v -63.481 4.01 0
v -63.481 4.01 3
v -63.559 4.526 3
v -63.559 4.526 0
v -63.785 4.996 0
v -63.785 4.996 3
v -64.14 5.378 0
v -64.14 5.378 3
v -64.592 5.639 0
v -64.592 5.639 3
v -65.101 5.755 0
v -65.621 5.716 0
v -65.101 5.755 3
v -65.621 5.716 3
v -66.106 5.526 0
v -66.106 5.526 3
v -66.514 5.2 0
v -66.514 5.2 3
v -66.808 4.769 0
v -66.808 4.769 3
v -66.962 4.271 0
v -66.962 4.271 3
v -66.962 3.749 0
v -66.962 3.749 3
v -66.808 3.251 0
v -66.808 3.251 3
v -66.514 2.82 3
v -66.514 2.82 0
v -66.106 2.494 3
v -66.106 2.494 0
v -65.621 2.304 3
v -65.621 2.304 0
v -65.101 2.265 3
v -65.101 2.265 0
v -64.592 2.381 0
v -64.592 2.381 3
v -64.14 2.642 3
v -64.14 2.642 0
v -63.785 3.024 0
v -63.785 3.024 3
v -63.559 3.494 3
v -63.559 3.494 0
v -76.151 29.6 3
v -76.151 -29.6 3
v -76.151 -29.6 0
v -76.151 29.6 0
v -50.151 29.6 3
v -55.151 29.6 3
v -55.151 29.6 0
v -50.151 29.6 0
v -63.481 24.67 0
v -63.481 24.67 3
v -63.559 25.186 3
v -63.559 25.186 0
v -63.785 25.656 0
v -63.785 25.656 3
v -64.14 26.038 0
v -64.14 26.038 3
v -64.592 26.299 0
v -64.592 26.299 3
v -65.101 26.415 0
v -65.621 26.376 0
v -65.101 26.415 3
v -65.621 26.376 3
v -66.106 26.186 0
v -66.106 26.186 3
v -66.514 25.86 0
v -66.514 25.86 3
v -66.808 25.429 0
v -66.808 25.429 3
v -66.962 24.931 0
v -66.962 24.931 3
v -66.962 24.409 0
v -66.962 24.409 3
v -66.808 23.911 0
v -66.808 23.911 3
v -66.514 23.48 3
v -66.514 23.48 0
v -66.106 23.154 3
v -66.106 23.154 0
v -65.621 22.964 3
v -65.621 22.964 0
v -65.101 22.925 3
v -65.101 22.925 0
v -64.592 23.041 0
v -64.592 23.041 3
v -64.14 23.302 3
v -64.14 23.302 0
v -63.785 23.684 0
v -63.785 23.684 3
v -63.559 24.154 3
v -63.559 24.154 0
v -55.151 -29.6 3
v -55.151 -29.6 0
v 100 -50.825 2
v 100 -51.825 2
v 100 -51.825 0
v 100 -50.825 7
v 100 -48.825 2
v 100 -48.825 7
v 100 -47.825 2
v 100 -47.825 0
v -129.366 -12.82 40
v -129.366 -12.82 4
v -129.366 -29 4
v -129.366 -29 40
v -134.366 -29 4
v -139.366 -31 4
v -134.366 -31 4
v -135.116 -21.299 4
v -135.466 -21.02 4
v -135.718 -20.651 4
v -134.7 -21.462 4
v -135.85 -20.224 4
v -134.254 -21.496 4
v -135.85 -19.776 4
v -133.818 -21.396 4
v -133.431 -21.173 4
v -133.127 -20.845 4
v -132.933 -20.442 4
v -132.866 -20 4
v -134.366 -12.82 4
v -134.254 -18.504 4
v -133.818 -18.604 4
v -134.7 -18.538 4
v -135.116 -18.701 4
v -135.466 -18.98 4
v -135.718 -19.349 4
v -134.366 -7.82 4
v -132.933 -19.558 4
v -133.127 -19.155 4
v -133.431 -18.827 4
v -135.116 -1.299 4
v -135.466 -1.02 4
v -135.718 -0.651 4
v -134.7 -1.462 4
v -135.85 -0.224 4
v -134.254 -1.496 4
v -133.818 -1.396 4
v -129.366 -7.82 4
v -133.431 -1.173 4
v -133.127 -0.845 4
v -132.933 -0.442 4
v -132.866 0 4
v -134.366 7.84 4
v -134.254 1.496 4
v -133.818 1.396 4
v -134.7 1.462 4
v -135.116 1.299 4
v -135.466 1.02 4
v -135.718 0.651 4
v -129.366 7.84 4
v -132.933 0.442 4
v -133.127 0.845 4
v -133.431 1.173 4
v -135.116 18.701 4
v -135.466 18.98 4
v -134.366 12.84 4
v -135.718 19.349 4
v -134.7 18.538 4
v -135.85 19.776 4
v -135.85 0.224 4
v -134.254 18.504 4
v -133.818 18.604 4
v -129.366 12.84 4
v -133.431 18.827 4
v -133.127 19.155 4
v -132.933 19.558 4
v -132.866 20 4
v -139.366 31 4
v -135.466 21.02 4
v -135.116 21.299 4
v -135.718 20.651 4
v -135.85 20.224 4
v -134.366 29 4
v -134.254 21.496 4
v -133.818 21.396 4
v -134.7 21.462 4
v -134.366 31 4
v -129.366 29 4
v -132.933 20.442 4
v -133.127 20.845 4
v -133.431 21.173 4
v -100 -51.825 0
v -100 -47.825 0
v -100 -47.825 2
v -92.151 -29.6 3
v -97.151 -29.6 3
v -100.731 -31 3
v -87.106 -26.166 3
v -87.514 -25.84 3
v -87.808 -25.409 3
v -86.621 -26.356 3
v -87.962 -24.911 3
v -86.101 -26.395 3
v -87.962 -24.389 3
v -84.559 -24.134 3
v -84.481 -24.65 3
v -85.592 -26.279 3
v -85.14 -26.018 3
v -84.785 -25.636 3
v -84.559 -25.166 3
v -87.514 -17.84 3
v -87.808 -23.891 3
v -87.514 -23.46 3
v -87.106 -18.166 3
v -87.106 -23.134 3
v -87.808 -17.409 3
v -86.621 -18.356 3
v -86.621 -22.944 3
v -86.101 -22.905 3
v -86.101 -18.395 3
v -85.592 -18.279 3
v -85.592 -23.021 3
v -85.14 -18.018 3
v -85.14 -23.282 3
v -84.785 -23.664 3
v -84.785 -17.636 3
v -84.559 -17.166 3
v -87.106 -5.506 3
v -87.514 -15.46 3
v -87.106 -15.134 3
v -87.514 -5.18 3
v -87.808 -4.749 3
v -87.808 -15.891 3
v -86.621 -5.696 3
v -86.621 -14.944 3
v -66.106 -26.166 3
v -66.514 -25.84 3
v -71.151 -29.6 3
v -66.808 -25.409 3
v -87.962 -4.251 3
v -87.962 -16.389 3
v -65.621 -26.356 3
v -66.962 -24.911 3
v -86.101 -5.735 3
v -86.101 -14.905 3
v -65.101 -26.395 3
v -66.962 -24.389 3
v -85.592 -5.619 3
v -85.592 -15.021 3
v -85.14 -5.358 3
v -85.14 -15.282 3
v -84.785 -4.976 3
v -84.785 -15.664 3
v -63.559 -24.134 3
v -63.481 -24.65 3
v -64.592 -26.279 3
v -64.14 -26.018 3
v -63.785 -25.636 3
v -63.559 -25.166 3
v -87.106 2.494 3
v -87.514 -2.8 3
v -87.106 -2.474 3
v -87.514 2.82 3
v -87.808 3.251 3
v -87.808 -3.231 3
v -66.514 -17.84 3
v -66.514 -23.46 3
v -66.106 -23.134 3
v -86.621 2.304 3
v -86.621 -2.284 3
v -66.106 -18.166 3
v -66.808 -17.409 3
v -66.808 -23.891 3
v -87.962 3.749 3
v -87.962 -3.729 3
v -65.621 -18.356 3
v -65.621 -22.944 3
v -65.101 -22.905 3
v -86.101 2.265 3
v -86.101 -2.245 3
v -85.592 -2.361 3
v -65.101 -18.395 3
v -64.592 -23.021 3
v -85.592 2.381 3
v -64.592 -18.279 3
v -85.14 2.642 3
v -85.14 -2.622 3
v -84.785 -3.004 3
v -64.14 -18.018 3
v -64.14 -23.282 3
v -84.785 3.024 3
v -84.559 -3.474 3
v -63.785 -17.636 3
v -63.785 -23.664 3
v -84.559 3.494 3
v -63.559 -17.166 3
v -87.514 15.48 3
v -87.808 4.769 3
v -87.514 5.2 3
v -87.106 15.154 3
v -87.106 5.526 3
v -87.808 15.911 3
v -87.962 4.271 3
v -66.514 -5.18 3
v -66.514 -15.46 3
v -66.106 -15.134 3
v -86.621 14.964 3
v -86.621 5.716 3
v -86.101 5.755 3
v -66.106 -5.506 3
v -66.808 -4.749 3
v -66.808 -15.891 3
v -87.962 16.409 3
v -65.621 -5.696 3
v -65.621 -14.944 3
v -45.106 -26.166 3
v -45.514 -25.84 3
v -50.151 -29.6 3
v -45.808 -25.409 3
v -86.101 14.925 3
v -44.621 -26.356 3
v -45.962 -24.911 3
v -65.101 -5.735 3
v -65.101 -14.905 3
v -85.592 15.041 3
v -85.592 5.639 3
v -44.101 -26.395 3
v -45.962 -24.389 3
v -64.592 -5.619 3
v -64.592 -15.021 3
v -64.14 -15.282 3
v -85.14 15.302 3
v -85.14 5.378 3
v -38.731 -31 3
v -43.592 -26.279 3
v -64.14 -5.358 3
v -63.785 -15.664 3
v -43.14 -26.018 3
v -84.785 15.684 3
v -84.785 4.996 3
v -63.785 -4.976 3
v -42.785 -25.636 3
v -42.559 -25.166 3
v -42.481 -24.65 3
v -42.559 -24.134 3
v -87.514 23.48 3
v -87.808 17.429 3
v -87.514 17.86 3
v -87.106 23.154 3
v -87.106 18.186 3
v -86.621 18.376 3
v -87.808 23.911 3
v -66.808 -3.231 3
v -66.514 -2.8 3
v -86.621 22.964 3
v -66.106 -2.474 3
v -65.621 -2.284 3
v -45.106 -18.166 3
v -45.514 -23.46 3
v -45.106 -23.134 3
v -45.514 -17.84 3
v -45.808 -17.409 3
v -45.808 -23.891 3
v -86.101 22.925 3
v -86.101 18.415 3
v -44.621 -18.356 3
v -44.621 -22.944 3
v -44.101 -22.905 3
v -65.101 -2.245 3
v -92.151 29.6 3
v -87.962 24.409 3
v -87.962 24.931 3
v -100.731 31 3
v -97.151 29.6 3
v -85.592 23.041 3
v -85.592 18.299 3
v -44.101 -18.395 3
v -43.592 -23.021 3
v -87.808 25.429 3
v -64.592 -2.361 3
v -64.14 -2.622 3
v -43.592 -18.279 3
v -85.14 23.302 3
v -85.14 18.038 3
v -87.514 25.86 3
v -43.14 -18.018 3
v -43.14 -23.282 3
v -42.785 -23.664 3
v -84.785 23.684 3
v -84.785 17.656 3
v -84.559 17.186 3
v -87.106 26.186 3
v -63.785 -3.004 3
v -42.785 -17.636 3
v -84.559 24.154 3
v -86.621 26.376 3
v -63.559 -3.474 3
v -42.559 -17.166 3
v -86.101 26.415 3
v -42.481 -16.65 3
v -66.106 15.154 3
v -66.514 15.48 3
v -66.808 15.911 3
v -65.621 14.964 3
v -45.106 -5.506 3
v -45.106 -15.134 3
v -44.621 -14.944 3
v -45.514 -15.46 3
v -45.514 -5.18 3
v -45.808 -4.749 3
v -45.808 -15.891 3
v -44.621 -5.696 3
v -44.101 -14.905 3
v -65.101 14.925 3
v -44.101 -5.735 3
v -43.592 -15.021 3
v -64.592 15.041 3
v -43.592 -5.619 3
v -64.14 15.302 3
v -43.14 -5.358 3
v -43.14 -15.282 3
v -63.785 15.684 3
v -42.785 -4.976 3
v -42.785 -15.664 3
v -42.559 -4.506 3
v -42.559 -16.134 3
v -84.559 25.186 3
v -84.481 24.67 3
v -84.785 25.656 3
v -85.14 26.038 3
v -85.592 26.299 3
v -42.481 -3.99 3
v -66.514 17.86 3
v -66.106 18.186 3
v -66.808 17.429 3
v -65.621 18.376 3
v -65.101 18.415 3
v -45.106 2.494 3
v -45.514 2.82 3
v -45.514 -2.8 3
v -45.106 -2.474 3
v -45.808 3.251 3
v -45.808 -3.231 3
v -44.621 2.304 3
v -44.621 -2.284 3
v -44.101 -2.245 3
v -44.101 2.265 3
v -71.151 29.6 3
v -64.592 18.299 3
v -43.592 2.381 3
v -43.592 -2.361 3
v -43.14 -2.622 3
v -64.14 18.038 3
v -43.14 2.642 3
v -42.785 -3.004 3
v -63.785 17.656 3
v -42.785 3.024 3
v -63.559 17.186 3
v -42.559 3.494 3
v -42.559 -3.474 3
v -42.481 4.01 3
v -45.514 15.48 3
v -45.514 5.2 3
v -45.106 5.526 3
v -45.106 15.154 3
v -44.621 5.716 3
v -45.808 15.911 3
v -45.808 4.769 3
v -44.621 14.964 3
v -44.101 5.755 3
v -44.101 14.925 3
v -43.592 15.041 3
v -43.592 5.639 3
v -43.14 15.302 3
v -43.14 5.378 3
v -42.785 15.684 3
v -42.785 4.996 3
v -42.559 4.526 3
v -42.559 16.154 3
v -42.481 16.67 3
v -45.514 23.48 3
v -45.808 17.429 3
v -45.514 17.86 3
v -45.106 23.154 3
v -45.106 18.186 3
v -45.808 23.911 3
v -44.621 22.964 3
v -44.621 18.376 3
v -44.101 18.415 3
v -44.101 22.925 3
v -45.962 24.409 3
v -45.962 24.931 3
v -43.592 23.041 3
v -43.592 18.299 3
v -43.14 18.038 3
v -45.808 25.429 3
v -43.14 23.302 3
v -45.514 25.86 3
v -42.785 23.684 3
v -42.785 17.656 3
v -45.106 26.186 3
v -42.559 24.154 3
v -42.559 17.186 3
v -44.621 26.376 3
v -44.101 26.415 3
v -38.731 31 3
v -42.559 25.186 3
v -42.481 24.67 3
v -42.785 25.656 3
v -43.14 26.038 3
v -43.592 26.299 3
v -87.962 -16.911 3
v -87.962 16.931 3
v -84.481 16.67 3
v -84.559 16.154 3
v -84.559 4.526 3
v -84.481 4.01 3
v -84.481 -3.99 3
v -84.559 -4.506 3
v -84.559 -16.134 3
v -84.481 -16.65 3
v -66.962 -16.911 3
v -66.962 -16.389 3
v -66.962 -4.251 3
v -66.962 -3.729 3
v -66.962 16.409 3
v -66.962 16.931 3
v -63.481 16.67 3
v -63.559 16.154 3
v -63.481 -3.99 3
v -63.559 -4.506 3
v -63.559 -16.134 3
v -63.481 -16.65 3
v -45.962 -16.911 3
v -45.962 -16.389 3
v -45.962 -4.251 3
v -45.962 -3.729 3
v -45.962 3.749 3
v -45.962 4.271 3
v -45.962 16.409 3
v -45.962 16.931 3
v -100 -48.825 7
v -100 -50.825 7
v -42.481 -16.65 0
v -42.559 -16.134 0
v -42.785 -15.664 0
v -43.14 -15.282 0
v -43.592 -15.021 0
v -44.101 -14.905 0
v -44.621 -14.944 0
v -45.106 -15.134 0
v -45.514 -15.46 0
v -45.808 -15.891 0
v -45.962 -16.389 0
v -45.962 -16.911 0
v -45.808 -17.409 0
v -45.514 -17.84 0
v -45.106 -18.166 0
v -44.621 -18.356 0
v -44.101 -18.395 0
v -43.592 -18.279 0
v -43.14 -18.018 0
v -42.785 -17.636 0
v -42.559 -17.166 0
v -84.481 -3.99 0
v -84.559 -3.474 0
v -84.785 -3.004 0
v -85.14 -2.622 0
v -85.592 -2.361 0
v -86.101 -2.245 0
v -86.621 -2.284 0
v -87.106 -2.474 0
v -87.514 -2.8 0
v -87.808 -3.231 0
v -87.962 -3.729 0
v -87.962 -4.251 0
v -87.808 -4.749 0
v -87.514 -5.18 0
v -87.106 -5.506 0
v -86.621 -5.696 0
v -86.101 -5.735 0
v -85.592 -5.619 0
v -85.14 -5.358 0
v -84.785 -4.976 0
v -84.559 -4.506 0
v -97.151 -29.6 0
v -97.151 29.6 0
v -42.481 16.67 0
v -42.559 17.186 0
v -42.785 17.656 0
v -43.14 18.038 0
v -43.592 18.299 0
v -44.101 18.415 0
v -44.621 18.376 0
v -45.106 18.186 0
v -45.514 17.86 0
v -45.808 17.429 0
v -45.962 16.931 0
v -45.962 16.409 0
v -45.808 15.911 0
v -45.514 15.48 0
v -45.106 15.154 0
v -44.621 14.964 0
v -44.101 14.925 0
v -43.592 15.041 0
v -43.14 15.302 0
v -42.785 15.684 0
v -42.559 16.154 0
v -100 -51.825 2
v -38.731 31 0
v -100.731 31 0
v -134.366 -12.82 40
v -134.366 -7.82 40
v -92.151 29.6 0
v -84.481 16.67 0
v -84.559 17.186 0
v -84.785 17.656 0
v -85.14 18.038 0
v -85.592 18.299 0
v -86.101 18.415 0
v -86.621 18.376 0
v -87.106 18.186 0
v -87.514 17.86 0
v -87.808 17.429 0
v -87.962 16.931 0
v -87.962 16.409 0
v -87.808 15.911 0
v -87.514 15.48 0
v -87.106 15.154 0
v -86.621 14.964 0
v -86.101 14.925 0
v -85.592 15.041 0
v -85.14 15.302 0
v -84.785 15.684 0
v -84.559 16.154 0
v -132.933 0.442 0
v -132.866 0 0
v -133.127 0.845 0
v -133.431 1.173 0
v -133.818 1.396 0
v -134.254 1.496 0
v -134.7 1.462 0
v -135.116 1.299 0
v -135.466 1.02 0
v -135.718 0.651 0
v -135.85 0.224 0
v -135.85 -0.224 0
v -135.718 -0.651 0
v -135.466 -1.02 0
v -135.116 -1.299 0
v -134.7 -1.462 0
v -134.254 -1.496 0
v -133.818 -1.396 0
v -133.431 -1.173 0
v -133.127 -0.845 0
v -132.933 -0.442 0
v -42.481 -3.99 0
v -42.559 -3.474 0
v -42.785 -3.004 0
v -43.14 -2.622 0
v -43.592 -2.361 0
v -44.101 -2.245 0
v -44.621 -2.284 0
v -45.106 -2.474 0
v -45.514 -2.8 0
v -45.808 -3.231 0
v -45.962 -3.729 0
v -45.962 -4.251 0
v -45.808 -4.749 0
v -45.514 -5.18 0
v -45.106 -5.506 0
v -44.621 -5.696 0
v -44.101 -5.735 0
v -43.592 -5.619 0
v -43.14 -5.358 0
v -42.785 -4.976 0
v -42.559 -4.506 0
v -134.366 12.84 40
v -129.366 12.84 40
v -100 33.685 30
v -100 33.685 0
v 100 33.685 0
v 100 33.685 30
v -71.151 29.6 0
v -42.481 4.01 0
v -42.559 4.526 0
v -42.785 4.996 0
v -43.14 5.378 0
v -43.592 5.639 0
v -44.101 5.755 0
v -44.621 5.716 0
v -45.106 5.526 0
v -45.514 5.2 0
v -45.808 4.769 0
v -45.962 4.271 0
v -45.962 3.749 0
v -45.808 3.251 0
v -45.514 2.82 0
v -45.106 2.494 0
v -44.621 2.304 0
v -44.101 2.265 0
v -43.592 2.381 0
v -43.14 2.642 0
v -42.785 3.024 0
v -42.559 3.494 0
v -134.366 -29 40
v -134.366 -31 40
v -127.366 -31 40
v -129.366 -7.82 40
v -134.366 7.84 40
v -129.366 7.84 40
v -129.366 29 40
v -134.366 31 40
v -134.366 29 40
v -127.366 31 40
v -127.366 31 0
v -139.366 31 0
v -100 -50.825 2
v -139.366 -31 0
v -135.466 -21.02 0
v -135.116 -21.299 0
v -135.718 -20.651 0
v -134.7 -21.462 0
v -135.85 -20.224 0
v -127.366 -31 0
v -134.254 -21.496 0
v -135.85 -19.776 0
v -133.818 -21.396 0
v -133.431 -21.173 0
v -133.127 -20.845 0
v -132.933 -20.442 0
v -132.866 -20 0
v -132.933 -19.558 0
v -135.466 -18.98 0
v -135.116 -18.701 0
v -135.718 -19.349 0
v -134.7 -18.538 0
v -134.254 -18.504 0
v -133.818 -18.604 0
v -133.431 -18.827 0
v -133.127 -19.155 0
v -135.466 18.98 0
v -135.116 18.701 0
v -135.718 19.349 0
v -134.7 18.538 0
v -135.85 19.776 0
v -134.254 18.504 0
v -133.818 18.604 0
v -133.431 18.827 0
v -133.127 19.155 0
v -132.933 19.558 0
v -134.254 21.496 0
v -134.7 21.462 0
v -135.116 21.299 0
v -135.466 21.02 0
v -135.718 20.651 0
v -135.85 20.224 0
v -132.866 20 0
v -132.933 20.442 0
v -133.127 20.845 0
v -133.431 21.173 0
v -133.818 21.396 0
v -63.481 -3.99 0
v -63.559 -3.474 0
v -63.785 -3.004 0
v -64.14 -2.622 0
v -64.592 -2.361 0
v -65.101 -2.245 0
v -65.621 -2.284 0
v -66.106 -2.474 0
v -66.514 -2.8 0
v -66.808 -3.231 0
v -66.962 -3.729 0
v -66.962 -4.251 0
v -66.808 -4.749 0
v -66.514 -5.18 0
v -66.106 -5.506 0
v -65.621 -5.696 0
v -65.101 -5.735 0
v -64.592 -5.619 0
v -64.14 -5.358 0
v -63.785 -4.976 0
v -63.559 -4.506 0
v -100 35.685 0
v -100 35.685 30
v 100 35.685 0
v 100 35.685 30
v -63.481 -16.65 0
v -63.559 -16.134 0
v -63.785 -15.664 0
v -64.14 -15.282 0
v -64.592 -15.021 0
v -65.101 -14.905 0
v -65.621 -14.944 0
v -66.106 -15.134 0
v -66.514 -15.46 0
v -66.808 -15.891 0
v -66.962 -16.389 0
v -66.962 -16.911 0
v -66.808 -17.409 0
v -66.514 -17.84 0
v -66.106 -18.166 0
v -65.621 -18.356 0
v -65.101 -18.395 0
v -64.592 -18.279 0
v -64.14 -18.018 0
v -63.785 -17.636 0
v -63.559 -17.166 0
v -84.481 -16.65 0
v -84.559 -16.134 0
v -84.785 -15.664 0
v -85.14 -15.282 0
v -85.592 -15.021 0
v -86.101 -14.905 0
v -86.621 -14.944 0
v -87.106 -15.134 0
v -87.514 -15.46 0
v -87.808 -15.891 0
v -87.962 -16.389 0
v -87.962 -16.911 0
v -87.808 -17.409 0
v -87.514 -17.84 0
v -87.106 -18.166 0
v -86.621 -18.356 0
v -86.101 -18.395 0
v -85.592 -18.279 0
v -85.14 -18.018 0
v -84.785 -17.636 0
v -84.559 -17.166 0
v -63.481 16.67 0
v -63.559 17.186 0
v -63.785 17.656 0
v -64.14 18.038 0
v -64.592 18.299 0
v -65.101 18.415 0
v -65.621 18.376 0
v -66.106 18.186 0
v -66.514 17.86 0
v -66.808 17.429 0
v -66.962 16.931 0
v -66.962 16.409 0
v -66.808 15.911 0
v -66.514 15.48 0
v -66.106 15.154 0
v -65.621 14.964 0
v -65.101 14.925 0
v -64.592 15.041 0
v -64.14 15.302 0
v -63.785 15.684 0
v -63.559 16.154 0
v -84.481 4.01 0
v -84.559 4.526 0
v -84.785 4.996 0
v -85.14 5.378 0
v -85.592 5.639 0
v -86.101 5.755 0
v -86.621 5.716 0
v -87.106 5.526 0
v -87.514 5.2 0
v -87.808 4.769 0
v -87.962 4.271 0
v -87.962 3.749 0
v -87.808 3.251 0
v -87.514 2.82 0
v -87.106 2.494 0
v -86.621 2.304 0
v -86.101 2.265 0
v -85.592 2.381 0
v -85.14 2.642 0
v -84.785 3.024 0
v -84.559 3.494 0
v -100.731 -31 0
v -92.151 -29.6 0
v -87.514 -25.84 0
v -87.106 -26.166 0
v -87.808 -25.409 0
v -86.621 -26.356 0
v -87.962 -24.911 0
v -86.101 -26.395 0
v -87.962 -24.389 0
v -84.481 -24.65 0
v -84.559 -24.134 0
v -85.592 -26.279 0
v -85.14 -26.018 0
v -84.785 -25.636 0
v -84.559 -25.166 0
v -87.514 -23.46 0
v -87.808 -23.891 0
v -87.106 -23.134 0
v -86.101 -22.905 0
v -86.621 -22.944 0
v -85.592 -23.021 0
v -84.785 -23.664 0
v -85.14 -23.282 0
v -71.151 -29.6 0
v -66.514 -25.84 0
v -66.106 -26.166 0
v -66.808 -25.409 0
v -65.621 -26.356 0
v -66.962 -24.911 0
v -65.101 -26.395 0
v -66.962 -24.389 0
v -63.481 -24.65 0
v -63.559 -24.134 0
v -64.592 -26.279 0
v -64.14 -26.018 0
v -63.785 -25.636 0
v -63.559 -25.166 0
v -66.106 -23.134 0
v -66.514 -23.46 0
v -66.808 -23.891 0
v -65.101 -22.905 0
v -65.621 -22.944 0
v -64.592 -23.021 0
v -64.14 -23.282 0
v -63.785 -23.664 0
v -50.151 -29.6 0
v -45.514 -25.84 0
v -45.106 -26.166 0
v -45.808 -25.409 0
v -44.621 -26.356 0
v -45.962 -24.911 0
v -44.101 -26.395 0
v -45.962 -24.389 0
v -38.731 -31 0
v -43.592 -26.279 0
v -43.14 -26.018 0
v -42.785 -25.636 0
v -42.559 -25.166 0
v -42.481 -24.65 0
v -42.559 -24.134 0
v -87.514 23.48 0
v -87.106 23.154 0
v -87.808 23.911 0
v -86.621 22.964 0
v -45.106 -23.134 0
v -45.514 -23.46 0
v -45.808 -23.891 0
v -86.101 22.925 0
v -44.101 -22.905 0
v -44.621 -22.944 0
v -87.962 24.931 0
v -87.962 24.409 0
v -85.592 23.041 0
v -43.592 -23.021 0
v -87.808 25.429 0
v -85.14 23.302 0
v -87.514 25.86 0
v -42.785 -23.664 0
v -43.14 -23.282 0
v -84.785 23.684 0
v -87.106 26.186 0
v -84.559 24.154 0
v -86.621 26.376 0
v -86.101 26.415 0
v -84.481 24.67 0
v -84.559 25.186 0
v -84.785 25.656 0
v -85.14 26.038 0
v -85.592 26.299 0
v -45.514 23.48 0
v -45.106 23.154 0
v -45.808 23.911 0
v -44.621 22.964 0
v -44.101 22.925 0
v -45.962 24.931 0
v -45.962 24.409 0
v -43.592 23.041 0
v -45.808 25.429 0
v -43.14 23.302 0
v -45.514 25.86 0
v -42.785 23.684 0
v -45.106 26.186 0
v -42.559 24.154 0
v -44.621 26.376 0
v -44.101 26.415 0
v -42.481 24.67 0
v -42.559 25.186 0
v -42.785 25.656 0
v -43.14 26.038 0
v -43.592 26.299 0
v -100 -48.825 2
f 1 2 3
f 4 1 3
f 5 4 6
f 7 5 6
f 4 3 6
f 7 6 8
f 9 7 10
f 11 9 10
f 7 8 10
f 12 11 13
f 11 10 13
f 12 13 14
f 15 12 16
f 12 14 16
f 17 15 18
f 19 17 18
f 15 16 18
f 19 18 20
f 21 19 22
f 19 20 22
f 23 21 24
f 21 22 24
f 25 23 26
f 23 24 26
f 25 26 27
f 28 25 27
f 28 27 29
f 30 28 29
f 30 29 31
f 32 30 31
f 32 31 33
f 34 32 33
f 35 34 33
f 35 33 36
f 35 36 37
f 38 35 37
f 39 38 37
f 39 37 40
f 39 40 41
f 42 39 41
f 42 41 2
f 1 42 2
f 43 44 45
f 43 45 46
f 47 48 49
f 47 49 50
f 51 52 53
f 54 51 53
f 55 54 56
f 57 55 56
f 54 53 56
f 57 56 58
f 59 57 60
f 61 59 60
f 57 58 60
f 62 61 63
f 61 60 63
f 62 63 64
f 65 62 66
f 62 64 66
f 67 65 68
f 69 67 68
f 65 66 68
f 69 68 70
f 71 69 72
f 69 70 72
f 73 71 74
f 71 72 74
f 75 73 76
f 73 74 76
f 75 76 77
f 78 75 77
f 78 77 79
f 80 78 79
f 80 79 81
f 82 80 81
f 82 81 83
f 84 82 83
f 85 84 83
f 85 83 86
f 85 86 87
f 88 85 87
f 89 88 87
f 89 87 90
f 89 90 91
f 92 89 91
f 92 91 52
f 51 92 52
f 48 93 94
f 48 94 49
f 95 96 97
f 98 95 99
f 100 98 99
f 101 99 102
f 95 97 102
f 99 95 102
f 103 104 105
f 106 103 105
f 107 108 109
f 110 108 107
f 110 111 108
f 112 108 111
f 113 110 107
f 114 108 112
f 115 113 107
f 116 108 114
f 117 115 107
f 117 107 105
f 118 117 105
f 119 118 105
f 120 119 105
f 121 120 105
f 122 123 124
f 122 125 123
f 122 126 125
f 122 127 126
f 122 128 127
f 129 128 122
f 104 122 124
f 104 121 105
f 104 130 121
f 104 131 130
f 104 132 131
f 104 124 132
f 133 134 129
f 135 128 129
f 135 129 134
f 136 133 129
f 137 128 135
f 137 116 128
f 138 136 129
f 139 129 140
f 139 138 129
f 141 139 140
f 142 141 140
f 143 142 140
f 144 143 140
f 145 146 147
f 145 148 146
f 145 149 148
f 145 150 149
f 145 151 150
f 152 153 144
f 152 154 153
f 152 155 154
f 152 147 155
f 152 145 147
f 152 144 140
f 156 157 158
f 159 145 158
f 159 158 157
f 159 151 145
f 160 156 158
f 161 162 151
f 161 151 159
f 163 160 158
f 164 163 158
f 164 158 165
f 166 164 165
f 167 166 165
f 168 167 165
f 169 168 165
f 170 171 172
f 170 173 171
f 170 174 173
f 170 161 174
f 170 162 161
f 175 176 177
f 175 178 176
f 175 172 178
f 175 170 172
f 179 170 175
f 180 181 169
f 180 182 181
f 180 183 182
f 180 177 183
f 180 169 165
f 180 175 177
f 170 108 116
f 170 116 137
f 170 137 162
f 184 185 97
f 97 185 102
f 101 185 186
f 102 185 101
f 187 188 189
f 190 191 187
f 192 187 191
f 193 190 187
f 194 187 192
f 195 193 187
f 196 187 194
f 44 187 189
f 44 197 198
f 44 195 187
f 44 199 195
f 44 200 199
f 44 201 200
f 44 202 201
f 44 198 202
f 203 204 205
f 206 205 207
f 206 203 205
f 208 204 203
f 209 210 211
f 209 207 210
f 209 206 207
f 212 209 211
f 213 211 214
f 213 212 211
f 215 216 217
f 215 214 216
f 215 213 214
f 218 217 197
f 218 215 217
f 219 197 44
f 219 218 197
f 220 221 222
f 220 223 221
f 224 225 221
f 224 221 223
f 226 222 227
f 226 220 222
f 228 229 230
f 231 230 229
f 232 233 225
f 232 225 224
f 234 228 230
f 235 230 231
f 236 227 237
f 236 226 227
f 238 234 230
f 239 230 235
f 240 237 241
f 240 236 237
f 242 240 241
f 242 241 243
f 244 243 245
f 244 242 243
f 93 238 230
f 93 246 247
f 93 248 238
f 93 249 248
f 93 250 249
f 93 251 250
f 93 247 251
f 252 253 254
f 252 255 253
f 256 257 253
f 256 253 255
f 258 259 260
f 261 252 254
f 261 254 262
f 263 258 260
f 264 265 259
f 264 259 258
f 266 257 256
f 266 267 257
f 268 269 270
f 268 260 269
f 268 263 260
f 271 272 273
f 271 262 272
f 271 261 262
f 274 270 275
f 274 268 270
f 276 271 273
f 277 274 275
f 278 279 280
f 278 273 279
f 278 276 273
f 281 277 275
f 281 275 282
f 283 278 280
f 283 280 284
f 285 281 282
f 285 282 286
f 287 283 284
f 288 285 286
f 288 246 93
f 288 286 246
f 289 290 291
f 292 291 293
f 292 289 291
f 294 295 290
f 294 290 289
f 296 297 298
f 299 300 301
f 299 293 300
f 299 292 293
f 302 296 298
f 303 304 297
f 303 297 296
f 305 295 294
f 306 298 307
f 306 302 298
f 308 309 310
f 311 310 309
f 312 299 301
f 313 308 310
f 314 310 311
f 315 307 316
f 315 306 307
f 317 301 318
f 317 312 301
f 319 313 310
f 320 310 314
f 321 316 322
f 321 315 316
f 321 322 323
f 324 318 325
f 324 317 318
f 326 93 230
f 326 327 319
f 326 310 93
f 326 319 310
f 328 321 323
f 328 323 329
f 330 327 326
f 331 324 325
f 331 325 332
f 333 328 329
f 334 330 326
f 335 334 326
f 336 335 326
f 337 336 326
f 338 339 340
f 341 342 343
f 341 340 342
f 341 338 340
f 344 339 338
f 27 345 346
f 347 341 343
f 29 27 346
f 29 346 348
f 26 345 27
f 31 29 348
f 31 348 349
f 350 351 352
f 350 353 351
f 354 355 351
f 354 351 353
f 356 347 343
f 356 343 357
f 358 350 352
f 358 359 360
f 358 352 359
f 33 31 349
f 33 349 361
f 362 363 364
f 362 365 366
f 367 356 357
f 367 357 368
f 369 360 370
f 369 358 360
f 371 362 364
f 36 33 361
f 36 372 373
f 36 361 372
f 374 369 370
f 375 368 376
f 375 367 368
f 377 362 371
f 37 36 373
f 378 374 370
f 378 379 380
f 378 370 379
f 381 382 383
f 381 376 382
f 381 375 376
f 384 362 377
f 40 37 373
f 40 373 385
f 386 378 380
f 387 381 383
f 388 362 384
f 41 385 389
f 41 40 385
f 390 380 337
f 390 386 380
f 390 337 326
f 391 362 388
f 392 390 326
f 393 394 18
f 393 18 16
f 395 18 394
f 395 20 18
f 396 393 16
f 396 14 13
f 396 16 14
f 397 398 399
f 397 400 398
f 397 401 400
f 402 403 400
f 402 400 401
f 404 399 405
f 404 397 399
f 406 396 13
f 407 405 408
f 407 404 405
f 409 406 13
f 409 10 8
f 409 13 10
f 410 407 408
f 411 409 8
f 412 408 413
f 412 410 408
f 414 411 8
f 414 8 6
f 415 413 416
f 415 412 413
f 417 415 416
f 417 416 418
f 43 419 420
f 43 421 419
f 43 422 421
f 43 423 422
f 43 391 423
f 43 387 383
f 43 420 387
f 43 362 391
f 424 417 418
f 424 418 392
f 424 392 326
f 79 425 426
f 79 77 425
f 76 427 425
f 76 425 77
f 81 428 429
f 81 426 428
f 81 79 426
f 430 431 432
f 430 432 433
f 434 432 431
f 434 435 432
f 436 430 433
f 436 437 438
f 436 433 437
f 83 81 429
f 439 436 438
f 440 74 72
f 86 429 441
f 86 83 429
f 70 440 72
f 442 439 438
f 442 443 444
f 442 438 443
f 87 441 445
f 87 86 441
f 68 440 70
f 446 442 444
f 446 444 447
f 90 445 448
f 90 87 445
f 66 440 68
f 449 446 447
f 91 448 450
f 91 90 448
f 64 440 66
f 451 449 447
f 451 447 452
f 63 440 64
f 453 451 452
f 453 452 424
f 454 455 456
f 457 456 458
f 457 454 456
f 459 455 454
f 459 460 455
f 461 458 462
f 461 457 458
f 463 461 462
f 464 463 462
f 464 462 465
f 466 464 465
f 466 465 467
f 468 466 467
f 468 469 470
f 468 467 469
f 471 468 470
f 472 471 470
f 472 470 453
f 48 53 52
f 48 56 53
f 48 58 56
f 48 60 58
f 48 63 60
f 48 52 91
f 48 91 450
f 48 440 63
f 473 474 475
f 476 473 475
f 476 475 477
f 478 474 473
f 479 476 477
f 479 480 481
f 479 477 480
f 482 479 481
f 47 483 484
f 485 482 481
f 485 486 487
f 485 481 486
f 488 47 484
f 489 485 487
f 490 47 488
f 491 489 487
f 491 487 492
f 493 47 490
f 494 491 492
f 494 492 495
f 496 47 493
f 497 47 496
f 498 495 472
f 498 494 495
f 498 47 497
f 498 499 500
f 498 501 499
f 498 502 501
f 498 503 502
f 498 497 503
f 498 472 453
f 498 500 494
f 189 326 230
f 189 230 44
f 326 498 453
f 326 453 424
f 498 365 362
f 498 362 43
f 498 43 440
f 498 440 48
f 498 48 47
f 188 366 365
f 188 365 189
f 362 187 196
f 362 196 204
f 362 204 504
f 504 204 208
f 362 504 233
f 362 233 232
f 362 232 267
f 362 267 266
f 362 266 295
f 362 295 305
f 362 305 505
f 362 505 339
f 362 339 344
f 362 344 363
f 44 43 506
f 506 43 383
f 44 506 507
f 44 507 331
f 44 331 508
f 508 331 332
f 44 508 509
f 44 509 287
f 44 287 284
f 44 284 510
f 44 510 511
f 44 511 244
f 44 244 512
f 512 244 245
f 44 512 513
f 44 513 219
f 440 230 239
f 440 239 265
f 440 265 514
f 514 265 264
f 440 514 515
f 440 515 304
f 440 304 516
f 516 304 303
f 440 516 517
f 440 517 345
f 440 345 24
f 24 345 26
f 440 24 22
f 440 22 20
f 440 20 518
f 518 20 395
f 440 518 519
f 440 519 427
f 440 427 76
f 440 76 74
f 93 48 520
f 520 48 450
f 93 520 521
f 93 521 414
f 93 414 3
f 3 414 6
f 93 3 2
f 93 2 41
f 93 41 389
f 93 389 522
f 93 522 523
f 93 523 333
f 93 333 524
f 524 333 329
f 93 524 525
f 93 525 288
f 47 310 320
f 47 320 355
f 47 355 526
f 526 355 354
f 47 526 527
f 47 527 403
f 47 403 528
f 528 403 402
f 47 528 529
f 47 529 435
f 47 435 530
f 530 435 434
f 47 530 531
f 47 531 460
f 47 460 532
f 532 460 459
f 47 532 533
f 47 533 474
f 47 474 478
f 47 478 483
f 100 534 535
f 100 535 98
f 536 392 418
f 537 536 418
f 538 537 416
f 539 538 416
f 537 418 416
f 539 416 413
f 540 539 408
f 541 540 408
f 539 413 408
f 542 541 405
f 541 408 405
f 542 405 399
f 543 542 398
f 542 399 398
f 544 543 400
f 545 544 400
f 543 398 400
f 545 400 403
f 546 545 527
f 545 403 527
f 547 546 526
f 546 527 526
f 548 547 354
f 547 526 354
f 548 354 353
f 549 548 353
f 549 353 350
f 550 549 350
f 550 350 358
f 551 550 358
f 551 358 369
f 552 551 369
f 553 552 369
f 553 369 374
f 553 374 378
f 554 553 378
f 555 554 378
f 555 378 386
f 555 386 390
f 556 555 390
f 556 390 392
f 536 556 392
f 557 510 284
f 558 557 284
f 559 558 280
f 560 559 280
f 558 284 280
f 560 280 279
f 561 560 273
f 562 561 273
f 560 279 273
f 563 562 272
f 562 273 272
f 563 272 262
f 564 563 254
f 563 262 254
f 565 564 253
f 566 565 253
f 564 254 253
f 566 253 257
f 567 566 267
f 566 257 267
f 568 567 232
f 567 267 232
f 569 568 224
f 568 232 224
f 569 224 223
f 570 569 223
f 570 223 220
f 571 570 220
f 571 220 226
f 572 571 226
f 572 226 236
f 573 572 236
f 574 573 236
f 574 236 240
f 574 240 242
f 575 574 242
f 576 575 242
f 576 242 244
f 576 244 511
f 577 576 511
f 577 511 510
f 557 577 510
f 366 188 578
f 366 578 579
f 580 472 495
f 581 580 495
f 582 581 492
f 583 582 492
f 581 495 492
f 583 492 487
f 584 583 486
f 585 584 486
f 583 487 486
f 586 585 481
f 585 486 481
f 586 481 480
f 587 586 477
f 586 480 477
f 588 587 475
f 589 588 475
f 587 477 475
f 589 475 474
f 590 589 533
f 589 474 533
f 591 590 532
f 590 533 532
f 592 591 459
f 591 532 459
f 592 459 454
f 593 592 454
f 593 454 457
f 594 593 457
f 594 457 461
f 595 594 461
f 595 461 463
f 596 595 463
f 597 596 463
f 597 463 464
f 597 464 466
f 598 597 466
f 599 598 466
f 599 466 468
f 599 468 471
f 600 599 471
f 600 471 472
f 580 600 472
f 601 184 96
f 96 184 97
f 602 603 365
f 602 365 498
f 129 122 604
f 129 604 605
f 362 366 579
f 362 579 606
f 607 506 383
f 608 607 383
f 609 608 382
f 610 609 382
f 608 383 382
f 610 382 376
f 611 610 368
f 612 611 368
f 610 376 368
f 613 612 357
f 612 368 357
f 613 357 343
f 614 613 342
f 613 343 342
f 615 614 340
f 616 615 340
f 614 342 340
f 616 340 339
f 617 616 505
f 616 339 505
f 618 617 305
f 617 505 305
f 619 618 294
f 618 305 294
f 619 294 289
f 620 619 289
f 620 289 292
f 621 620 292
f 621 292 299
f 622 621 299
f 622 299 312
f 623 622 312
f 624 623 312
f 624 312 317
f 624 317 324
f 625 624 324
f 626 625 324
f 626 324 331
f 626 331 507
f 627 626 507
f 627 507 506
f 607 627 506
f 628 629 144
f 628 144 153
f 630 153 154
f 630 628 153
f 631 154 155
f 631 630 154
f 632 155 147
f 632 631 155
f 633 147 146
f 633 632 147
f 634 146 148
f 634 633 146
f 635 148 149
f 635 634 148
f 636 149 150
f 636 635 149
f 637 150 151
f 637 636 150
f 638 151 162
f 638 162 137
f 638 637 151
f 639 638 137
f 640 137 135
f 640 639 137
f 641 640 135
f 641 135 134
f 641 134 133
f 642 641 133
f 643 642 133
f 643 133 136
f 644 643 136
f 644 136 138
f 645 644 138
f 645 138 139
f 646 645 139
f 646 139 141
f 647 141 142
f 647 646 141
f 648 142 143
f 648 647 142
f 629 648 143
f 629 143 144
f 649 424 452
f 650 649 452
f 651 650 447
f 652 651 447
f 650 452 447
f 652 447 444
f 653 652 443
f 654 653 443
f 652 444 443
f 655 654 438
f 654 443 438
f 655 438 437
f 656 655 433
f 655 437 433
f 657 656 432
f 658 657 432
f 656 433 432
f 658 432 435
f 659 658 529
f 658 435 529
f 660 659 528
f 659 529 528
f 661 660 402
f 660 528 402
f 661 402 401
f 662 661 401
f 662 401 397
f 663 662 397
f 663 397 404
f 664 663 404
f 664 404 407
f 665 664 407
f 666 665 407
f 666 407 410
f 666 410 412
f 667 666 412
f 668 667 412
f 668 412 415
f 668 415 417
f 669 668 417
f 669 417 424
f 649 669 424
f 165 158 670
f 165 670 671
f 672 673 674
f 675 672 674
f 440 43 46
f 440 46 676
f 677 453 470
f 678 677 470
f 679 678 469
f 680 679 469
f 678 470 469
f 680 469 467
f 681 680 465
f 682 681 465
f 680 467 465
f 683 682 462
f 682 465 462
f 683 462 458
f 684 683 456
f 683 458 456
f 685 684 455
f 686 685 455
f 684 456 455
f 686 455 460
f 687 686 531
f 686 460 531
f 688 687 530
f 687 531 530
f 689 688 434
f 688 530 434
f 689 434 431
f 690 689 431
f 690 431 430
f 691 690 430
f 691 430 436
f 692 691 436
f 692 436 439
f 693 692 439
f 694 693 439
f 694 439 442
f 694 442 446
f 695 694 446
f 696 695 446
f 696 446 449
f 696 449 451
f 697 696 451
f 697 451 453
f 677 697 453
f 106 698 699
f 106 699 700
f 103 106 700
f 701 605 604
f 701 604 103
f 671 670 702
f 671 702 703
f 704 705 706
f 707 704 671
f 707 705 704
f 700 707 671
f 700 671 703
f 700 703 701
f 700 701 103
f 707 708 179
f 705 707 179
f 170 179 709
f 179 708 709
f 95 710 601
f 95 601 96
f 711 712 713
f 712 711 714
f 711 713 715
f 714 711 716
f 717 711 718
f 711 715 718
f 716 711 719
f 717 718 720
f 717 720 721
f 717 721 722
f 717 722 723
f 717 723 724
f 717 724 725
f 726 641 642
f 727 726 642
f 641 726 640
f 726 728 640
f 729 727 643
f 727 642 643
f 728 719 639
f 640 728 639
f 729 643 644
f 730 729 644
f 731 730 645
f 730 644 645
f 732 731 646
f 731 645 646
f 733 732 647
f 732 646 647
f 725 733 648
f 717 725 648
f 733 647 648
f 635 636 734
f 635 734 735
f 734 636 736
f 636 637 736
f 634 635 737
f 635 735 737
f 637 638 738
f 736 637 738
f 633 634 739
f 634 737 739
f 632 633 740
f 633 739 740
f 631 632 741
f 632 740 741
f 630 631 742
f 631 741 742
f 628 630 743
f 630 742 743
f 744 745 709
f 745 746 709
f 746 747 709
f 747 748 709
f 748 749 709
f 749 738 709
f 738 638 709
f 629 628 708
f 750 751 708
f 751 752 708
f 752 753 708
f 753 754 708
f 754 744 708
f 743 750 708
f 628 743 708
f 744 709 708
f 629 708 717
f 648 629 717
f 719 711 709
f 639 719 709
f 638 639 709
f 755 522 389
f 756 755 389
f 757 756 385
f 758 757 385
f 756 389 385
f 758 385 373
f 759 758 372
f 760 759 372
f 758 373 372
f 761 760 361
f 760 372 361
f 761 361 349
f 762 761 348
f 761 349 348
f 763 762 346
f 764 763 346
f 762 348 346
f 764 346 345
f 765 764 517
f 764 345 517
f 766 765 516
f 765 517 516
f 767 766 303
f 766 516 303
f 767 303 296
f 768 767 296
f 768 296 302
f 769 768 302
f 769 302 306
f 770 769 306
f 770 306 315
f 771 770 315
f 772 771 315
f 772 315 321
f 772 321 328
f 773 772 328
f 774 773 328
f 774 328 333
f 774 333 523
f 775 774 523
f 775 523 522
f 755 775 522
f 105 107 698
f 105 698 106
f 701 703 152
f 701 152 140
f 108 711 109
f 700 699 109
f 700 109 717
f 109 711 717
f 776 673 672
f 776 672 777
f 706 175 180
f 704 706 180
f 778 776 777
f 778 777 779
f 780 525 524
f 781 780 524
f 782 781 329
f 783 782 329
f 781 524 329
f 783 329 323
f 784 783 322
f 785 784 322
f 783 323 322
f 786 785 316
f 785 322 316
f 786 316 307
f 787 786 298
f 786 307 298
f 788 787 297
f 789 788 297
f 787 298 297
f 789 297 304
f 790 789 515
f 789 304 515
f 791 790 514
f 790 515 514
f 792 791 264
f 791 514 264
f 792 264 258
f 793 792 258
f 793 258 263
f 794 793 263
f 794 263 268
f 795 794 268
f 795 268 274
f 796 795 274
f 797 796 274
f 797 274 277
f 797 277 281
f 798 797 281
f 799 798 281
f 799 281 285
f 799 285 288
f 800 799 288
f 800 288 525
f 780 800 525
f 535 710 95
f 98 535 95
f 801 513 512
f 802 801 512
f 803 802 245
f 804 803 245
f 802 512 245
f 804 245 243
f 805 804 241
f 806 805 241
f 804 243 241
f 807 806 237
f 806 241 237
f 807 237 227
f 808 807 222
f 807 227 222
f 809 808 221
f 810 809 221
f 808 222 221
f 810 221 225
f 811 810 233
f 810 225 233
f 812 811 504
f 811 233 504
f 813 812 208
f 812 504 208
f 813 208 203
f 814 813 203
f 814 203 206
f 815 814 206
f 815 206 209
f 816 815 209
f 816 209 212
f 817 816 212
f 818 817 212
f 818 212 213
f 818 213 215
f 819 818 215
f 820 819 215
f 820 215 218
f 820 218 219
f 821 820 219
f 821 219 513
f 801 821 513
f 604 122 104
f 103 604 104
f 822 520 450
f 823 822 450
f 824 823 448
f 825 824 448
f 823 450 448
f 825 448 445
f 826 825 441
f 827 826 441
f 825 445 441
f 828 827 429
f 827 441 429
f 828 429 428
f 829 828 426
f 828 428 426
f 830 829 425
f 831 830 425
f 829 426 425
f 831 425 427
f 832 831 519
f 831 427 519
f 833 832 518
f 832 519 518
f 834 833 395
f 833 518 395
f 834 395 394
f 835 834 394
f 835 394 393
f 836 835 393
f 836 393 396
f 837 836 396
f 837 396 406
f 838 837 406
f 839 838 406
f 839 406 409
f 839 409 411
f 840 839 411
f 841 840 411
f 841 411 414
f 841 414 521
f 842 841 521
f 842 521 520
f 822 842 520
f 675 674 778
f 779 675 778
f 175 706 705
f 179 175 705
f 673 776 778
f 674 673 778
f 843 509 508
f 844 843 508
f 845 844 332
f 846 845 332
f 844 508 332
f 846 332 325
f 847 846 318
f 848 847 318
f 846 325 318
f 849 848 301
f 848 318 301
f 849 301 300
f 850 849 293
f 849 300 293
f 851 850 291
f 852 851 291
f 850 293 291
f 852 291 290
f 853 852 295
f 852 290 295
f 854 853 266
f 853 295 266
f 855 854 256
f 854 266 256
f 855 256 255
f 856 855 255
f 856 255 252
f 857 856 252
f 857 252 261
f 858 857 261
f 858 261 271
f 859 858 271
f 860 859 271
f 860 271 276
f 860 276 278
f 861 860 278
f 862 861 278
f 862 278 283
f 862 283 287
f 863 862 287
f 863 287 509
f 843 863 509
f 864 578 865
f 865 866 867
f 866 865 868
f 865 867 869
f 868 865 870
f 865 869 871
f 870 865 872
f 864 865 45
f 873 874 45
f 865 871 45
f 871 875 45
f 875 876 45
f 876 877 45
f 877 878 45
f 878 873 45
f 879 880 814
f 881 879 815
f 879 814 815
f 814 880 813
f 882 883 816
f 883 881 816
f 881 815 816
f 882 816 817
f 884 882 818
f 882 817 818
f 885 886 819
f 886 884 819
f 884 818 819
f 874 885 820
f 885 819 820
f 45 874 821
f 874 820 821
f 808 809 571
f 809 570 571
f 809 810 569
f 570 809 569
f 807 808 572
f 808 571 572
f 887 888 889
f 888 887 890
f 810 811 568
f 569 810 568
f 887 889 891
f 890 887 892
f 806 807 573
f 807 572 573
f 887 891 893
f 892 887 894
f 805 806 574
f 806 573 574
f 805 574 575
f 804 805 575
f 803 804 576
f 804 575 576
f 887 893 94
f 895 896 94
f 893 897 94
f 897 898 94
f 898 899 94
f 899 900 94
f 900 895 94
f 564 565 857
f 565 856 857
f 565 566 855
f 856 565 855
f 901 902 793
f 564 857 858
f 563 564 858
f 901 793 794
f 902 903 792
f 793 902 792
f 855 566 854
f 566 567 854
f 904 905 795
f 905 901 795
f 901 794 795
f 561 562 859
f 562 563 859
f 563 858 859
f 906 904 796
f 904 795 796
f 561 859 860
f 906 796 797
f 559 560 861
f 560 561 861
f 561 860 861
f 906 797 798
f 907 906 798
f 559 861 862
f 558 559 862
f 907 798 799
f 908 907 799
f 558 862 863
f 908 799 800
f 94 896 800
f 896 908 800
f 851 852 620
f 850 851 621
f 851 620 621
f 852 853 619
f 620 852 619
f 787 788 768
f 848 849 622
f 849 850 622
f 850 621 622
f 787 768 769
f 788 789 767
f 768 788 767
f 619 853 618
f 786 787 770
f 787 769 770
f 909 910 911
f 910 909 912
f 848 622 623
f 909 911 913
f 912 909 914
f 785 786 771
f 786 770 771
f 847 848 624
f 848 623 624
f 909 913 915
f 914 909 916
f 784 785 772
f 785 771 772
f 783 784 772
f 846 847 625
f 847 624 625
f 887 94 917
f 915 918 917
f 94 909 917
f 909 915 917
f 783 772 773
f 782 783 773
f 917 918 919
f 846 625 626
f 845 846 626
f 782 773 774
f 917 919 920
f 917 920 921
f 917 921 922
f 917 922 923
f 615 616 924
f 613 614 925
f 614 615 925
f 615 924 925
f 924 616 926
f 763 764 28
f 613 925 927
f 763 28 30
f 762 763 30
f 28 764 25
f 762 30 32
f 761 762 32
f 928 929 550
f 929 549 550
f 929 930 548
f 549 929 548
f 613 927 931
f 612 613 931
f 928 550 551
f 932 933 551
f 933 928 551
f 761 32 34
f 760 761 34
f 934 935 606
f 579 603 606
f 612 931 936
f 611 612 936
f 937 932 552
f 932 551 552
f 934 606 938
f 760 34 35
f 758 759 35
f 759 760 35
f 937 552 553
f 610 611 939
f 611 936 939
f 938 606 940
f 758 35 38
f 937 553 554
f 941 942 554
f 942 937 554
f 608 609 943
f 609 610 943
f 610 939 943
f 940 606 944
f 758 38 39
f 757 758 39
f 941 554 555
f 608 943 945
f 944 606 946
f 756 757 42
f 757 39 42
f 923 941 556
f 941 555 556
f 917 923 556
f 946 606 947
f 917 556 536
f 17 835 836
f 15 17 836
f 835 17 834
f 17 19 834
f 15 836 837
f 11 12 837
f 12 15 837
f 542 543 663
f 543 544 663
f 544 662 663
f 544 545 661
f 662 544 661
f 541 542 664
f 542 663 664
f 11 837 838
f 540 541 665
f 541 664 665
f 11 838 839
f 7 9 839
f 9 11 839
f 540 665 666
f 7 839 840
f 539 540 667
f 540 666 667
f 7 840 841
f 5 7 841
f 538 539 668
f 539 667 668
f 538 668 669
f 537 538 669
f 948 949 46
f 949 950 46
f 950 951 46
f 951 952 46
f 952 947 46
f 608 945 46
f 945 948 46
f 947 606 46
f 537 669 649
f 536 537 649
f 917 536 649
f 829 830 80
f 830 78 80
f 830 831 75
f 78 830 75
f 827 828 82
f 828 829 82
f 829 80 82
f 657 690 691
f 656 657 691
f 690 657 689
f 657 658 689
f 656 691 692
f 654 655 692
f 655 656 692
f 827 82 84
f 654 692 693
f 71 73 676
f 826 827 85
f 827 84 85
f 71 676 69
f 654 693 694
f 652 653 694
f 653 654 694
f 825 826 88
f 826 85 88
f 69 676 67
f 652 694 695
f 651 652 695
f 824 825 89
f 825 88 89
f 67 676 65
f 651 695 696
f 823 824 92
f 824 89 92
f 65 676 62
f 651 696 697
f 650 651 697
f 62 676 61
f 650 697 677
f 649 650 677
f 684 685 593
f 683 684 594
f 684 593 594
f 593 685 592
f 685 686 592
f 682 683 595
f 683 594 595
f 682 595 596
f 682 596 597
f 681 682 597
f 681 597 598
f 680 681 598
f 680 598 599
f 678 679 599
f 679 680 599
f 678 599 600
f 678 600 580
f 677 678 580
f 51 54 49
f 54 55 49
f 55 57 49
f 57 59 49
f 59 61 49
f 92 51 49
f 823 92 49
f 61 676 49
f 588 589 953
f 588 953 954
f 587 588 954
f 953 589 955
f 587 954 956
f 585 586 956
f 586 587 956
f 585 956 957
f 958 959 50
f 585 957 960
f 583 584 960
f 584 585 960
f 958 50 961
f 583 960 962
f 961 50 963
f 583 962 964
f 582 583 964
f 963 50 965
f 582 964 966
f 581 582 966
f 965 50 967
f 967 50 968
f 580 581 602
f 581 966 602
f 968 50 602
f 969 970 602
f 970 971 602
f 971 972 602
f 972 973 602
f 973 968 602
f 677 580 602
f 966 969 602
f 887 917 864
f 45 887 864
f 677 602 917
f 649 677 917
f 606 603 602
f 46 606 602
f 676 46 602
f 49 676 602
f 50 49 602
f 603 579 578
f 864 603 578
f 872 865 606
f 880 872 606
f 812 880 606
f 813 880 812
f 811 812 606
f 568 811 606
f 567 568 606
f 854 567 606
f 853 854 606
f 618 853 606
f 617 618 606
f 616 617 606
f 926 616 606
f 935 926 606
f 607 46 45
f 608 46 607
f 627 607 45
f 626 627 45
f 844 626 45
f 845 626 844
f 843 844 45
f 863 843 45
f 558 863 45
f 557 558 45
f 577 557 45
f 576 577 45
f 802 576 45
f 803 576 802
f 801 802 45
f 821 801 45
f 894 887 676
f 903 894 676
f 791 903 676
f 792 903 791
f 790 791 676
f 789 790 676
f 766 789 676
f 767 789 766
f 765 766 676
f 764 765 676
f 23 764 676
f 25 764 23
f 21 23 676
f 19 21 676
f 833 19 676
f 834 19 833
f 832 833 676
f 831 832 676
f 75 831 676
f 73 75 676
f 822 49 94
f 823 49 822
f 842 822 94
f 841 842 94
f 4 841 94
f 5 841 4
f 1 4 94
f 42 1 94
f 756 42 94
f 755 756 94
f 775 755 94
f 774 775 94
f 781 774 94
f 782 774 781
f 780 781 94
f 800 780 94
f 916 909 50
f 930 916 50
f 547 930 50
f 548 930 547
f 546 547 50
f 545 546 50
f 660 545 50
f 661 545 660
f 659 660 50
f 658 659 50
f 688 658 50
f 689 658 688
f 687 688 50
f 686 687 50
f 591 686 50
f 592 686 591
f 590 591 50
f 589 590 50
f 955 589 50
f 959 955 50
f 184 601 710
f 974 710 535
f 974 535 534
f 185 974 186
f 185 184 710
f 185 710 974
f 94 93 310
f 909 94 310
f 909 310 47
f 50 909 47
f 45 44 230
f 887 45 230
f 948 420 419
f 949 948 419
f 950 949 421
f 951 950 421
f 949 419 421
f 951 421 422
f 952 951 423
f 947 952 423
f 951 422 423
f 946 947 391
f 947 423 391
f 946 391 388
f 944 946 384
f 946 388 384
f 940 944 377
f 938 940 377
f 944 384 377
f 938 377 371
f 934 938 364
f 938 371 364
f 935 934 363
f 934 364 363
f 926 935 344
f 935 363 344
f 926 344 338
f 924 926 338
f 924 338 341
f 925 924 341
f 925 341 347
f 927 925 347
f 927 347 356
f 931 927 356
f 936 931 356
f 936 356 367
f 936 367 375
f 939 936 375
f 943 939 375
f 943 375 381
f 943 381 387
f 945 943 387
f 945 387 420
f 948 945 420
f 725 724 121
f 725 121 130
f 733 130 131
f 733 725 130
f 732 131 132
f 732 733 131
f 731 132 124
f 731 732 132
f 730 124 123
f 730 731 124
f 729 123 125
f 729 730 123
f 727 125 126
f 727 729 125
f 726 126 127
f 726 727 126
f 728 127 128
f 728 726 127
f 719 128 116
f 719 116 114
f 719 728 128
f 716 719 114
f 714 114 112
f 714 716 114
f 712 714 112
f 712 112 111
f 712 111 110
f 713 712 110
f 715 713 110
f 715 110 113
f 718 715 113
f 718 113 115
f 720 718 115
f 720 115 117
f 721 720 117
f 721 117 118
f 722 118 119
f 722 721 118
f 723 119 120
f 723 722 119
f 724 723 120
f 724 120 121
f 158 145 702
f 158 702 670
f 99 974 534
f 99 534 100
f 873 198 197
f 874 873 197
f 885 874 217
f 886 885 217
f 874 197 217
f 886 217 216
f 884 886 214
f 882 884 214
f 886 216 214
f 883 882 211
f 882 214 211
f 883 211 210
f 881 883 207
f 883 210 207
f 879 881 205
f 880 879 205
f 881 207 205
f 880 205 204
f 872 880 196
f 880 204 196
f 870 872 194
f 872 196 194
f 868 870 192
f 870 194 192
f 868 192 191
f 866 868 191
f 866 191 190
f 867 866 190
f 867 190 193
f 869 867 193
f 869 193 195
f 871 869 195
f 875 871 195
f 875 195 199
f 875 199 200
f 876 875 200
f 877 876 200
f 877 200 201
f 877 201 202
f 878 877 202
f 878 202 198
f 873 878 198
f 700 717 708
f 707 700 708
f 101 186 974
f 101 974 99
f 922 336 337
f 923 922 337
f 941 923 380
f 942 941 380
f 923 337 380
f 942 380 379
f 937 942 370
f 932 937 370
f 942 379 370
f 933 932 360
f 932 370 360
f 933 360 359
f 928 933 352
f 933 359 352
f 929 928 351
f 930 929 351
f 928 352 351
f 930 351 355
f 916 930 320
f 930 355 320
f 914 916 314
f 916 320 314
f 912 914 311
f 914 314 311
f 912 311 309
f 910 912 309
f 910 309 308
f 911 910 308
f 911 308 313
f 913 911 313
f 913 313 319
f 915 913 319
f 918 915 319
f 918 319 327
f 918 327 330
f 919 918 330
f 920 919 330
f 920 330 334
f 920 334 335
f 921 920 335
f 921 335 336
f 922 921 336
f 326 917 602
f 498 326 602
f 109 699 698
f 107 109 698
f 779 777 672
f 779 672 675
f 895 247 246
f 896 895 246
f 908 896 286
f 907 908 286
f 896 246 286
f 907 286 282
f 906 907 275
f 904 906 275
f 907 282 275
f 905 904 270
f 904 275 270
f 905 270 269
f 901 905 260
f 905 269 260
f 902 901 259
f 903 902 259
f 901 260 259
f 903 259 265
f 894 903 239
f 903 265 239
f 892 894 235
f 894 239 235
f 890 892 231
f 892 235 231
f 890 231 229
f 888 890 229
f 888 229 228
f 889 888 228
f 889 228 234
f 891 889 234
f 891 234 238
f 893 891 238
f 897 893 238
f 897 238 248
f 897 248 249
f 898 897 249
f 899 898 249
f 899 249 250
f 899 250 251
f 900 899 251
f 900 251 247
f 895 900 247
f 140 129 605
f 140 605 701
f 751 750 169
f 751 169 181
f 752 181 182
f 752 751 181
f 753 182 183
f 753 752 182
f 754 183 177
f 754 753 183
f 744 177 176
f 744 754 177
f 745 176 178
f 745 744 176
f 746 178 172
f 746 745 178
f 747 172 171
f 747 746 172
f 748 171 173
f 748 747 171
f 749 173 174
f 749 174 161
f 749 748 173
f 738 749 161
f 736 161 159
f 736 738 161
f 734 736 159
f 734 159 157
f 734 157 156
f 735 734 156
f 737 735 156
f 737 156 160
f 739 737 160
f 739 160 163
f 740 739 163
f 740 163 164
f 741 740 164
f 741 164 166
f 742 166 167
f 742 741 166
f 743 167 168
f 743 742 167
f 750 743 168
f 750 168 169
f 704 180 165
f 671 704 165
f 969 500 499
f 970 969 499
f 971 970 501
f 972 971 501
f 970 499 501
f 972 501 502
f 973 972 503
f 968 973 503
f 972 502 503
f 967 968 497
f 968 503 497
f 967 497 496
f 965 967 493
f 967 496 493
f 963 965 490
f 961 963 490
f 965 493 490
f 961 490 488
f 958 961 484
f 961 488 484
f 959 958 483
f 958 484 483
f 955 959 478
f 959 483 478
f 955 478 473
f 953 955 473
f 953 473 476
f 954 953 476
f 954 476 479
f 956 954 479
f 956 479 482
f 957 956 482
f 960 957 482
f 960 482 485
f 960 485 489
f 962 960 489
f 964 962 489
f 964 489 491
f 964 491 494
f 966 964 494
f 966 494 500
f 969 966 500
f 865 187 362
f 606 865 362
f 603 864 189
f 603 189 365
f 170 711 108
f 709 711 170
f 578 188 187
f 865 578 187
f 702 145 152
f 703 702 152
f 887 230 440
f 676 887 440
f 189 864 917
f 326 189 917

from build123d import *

# Parameters (mm, degrees)
F0_W      = 62
F0_H      = 62
F1_DEPTH  = 3
F2_R      = 1.75
F2_W      = 5
F2_H      = 59.2
F3_DEPTH  = 25
F4_W      = 10
F4_H      = 62
F4_R      = 1.5
F5_DEPTH  = 4
F6_W      = 5
F6_H      = 2
F6_H_2    = 5
F7_DEPTH  = 40
F8_W      = 200
F8_H      = 2
F9_DEPTH  = 30
F10_W     = 200
F10_H     = 4
F11_DEPTH = 2
F12_W     = 200
F12_H     = 2
F13_DEPTH = 5


with BuildPart() as f1:
    # F0 (on Top) → F1 (new body)
    with BuildSketch(Plane.XY):
        with Locations((-69.7313, 0)):
            Rectangle(F0_W, F0_H)
    extrude(amount=F1_DEPTH)

    # F2 (on face) → F3 (cut)
    with BuildSketch(Plane.XY.offset(3)):
        with Locations((-86.2313, 24.67)):
            Circle(F2_R)
        with Locations((-86.2313, 16.67)):
            Circle(F2_R)
        with Locations((-86.2313, 4.01)):
            Circle(F2_R)
        with Locations((-86.2313, -3.99)):
            Circle(F2_R)
        with Locations((-86.2313, -16.65)):
            Circle(F2_R)
        with Locations((-86.2313, -24.65)):
            Circle(F2_R)
        with Locations((-65.2313, 24.67)):
            Circle(F2_R)
        with Locations((-65.2313, 16.67)):
            Circle(F2_R)
        with Locations((-65.2313, 4.01)):
            Circle(F2_R)
        with Locations((-65.2313, -3.99)):
            Circle(F2_R)
        with Locations((-65.2313, -16.65)):
            Circle(F2_R)
        with Locations((-65.2313, -24.65)):
            Circle(F2_R)
        with Locations((-44.2313, 24.67)):
            Circle(F2_R)
        with Locations((-44.2313, 16.67)):
            Circle(F2_R)
        with Locations((-44.2313, 4.01)):
            Circle(F2_R)
        with Locations((-44.2313, -3.99)):
            Circle(F2_R)
        with Locations((-44.2313, -16.65)):
            Circle(F2_R)
        with Locations((-44.2313, -24.65)):
            Circle(F2_R)
        with Locations((-94.6513, 0)):
            Rectangle(F2_W, F2_H)
        with Locations((-73.6513, 0)):
            Rectangle(F2_W, F2_H)
        with Locations((-52.6513, 0)):
            Rectangle(F2_W, F2_H)
    extrude(amount=-F3_DEPTH, mode=Mode.SUBTRACT)


with BuildPart() as f5:
    # F4 (on Top) → F5 (new body)
    with BuildSketch(Plane.XY):
        with Locations((-134.366446, 0)):
            Rectangle(F4_W, F4_H)
        with Locations((-134.366446, -20)):
            Circle(F4_R, mode=Mode.SUBTRACT)
        with Locations((-134.366446, 0)):
            Circle(F4_R, mode=Mode.SUBTRACT)
        with Locations((-134.366446, 20)):
            Circle(F4_R, mode=Mode.SUBTRACT)
    extrude(amount=F5_DEPTH)

    # F6 (on Top) → F7 (join)
    with BuildSketch(Plane.XY):
        Polygon((-129.366446, -31), (-127.366446, -31), (-127.366446, 31), (-129.366446, 31), (-129.366446, 29), (-129.366446, 12.84), (-129.366446, 7.84), (-129.366446, -7.82), (-129.366446, -12.82), (-129.366446, -29), align=None)
        with Locations((-131.866446, -30)):
            Rectangle(F6_W, F6_H)
        with Locations((-131.866446, 30)):
            Rectangle(F6_W, F6_H)
        with Locations((-131.866446, -10.32)):
            Rectangle(F6_W, F6_H_2)
        with Locations((-131.866446, 10.34)):
            Rectangle(F6_W, F6_H_2)
    extrude(amount=F7_DEPTH)


with BuildPart() as f9:
    # F8 (on Top) → F9 (new body)
    with BuildSketch(Plane.XY):
        with Locations((0, 34.685362)):
            Rectangle(F8_W, F8_H)
    extrude(amount=F9_DEPTH)


with BuildPart() as f11:
    # F10 (on Top) → F11 (new body)
    with BuildSketch(Plane.XY):
        with Locations((0, -49.825105)):
            Rectangle(F10_W, F10_H)
    extrude(amount=F11_DEPTH)

    # F12 (on face) → F13 (join)
    with BuildSketch(Plane.XY.offset(2)):
        with Locations((0, -49.825105)):
            Rectangle(F12_W, F12_H)
    extrude(amount=F13_DEPTH)


solid = Compound([f1.part, f5.part, f9.part, f11.part])
